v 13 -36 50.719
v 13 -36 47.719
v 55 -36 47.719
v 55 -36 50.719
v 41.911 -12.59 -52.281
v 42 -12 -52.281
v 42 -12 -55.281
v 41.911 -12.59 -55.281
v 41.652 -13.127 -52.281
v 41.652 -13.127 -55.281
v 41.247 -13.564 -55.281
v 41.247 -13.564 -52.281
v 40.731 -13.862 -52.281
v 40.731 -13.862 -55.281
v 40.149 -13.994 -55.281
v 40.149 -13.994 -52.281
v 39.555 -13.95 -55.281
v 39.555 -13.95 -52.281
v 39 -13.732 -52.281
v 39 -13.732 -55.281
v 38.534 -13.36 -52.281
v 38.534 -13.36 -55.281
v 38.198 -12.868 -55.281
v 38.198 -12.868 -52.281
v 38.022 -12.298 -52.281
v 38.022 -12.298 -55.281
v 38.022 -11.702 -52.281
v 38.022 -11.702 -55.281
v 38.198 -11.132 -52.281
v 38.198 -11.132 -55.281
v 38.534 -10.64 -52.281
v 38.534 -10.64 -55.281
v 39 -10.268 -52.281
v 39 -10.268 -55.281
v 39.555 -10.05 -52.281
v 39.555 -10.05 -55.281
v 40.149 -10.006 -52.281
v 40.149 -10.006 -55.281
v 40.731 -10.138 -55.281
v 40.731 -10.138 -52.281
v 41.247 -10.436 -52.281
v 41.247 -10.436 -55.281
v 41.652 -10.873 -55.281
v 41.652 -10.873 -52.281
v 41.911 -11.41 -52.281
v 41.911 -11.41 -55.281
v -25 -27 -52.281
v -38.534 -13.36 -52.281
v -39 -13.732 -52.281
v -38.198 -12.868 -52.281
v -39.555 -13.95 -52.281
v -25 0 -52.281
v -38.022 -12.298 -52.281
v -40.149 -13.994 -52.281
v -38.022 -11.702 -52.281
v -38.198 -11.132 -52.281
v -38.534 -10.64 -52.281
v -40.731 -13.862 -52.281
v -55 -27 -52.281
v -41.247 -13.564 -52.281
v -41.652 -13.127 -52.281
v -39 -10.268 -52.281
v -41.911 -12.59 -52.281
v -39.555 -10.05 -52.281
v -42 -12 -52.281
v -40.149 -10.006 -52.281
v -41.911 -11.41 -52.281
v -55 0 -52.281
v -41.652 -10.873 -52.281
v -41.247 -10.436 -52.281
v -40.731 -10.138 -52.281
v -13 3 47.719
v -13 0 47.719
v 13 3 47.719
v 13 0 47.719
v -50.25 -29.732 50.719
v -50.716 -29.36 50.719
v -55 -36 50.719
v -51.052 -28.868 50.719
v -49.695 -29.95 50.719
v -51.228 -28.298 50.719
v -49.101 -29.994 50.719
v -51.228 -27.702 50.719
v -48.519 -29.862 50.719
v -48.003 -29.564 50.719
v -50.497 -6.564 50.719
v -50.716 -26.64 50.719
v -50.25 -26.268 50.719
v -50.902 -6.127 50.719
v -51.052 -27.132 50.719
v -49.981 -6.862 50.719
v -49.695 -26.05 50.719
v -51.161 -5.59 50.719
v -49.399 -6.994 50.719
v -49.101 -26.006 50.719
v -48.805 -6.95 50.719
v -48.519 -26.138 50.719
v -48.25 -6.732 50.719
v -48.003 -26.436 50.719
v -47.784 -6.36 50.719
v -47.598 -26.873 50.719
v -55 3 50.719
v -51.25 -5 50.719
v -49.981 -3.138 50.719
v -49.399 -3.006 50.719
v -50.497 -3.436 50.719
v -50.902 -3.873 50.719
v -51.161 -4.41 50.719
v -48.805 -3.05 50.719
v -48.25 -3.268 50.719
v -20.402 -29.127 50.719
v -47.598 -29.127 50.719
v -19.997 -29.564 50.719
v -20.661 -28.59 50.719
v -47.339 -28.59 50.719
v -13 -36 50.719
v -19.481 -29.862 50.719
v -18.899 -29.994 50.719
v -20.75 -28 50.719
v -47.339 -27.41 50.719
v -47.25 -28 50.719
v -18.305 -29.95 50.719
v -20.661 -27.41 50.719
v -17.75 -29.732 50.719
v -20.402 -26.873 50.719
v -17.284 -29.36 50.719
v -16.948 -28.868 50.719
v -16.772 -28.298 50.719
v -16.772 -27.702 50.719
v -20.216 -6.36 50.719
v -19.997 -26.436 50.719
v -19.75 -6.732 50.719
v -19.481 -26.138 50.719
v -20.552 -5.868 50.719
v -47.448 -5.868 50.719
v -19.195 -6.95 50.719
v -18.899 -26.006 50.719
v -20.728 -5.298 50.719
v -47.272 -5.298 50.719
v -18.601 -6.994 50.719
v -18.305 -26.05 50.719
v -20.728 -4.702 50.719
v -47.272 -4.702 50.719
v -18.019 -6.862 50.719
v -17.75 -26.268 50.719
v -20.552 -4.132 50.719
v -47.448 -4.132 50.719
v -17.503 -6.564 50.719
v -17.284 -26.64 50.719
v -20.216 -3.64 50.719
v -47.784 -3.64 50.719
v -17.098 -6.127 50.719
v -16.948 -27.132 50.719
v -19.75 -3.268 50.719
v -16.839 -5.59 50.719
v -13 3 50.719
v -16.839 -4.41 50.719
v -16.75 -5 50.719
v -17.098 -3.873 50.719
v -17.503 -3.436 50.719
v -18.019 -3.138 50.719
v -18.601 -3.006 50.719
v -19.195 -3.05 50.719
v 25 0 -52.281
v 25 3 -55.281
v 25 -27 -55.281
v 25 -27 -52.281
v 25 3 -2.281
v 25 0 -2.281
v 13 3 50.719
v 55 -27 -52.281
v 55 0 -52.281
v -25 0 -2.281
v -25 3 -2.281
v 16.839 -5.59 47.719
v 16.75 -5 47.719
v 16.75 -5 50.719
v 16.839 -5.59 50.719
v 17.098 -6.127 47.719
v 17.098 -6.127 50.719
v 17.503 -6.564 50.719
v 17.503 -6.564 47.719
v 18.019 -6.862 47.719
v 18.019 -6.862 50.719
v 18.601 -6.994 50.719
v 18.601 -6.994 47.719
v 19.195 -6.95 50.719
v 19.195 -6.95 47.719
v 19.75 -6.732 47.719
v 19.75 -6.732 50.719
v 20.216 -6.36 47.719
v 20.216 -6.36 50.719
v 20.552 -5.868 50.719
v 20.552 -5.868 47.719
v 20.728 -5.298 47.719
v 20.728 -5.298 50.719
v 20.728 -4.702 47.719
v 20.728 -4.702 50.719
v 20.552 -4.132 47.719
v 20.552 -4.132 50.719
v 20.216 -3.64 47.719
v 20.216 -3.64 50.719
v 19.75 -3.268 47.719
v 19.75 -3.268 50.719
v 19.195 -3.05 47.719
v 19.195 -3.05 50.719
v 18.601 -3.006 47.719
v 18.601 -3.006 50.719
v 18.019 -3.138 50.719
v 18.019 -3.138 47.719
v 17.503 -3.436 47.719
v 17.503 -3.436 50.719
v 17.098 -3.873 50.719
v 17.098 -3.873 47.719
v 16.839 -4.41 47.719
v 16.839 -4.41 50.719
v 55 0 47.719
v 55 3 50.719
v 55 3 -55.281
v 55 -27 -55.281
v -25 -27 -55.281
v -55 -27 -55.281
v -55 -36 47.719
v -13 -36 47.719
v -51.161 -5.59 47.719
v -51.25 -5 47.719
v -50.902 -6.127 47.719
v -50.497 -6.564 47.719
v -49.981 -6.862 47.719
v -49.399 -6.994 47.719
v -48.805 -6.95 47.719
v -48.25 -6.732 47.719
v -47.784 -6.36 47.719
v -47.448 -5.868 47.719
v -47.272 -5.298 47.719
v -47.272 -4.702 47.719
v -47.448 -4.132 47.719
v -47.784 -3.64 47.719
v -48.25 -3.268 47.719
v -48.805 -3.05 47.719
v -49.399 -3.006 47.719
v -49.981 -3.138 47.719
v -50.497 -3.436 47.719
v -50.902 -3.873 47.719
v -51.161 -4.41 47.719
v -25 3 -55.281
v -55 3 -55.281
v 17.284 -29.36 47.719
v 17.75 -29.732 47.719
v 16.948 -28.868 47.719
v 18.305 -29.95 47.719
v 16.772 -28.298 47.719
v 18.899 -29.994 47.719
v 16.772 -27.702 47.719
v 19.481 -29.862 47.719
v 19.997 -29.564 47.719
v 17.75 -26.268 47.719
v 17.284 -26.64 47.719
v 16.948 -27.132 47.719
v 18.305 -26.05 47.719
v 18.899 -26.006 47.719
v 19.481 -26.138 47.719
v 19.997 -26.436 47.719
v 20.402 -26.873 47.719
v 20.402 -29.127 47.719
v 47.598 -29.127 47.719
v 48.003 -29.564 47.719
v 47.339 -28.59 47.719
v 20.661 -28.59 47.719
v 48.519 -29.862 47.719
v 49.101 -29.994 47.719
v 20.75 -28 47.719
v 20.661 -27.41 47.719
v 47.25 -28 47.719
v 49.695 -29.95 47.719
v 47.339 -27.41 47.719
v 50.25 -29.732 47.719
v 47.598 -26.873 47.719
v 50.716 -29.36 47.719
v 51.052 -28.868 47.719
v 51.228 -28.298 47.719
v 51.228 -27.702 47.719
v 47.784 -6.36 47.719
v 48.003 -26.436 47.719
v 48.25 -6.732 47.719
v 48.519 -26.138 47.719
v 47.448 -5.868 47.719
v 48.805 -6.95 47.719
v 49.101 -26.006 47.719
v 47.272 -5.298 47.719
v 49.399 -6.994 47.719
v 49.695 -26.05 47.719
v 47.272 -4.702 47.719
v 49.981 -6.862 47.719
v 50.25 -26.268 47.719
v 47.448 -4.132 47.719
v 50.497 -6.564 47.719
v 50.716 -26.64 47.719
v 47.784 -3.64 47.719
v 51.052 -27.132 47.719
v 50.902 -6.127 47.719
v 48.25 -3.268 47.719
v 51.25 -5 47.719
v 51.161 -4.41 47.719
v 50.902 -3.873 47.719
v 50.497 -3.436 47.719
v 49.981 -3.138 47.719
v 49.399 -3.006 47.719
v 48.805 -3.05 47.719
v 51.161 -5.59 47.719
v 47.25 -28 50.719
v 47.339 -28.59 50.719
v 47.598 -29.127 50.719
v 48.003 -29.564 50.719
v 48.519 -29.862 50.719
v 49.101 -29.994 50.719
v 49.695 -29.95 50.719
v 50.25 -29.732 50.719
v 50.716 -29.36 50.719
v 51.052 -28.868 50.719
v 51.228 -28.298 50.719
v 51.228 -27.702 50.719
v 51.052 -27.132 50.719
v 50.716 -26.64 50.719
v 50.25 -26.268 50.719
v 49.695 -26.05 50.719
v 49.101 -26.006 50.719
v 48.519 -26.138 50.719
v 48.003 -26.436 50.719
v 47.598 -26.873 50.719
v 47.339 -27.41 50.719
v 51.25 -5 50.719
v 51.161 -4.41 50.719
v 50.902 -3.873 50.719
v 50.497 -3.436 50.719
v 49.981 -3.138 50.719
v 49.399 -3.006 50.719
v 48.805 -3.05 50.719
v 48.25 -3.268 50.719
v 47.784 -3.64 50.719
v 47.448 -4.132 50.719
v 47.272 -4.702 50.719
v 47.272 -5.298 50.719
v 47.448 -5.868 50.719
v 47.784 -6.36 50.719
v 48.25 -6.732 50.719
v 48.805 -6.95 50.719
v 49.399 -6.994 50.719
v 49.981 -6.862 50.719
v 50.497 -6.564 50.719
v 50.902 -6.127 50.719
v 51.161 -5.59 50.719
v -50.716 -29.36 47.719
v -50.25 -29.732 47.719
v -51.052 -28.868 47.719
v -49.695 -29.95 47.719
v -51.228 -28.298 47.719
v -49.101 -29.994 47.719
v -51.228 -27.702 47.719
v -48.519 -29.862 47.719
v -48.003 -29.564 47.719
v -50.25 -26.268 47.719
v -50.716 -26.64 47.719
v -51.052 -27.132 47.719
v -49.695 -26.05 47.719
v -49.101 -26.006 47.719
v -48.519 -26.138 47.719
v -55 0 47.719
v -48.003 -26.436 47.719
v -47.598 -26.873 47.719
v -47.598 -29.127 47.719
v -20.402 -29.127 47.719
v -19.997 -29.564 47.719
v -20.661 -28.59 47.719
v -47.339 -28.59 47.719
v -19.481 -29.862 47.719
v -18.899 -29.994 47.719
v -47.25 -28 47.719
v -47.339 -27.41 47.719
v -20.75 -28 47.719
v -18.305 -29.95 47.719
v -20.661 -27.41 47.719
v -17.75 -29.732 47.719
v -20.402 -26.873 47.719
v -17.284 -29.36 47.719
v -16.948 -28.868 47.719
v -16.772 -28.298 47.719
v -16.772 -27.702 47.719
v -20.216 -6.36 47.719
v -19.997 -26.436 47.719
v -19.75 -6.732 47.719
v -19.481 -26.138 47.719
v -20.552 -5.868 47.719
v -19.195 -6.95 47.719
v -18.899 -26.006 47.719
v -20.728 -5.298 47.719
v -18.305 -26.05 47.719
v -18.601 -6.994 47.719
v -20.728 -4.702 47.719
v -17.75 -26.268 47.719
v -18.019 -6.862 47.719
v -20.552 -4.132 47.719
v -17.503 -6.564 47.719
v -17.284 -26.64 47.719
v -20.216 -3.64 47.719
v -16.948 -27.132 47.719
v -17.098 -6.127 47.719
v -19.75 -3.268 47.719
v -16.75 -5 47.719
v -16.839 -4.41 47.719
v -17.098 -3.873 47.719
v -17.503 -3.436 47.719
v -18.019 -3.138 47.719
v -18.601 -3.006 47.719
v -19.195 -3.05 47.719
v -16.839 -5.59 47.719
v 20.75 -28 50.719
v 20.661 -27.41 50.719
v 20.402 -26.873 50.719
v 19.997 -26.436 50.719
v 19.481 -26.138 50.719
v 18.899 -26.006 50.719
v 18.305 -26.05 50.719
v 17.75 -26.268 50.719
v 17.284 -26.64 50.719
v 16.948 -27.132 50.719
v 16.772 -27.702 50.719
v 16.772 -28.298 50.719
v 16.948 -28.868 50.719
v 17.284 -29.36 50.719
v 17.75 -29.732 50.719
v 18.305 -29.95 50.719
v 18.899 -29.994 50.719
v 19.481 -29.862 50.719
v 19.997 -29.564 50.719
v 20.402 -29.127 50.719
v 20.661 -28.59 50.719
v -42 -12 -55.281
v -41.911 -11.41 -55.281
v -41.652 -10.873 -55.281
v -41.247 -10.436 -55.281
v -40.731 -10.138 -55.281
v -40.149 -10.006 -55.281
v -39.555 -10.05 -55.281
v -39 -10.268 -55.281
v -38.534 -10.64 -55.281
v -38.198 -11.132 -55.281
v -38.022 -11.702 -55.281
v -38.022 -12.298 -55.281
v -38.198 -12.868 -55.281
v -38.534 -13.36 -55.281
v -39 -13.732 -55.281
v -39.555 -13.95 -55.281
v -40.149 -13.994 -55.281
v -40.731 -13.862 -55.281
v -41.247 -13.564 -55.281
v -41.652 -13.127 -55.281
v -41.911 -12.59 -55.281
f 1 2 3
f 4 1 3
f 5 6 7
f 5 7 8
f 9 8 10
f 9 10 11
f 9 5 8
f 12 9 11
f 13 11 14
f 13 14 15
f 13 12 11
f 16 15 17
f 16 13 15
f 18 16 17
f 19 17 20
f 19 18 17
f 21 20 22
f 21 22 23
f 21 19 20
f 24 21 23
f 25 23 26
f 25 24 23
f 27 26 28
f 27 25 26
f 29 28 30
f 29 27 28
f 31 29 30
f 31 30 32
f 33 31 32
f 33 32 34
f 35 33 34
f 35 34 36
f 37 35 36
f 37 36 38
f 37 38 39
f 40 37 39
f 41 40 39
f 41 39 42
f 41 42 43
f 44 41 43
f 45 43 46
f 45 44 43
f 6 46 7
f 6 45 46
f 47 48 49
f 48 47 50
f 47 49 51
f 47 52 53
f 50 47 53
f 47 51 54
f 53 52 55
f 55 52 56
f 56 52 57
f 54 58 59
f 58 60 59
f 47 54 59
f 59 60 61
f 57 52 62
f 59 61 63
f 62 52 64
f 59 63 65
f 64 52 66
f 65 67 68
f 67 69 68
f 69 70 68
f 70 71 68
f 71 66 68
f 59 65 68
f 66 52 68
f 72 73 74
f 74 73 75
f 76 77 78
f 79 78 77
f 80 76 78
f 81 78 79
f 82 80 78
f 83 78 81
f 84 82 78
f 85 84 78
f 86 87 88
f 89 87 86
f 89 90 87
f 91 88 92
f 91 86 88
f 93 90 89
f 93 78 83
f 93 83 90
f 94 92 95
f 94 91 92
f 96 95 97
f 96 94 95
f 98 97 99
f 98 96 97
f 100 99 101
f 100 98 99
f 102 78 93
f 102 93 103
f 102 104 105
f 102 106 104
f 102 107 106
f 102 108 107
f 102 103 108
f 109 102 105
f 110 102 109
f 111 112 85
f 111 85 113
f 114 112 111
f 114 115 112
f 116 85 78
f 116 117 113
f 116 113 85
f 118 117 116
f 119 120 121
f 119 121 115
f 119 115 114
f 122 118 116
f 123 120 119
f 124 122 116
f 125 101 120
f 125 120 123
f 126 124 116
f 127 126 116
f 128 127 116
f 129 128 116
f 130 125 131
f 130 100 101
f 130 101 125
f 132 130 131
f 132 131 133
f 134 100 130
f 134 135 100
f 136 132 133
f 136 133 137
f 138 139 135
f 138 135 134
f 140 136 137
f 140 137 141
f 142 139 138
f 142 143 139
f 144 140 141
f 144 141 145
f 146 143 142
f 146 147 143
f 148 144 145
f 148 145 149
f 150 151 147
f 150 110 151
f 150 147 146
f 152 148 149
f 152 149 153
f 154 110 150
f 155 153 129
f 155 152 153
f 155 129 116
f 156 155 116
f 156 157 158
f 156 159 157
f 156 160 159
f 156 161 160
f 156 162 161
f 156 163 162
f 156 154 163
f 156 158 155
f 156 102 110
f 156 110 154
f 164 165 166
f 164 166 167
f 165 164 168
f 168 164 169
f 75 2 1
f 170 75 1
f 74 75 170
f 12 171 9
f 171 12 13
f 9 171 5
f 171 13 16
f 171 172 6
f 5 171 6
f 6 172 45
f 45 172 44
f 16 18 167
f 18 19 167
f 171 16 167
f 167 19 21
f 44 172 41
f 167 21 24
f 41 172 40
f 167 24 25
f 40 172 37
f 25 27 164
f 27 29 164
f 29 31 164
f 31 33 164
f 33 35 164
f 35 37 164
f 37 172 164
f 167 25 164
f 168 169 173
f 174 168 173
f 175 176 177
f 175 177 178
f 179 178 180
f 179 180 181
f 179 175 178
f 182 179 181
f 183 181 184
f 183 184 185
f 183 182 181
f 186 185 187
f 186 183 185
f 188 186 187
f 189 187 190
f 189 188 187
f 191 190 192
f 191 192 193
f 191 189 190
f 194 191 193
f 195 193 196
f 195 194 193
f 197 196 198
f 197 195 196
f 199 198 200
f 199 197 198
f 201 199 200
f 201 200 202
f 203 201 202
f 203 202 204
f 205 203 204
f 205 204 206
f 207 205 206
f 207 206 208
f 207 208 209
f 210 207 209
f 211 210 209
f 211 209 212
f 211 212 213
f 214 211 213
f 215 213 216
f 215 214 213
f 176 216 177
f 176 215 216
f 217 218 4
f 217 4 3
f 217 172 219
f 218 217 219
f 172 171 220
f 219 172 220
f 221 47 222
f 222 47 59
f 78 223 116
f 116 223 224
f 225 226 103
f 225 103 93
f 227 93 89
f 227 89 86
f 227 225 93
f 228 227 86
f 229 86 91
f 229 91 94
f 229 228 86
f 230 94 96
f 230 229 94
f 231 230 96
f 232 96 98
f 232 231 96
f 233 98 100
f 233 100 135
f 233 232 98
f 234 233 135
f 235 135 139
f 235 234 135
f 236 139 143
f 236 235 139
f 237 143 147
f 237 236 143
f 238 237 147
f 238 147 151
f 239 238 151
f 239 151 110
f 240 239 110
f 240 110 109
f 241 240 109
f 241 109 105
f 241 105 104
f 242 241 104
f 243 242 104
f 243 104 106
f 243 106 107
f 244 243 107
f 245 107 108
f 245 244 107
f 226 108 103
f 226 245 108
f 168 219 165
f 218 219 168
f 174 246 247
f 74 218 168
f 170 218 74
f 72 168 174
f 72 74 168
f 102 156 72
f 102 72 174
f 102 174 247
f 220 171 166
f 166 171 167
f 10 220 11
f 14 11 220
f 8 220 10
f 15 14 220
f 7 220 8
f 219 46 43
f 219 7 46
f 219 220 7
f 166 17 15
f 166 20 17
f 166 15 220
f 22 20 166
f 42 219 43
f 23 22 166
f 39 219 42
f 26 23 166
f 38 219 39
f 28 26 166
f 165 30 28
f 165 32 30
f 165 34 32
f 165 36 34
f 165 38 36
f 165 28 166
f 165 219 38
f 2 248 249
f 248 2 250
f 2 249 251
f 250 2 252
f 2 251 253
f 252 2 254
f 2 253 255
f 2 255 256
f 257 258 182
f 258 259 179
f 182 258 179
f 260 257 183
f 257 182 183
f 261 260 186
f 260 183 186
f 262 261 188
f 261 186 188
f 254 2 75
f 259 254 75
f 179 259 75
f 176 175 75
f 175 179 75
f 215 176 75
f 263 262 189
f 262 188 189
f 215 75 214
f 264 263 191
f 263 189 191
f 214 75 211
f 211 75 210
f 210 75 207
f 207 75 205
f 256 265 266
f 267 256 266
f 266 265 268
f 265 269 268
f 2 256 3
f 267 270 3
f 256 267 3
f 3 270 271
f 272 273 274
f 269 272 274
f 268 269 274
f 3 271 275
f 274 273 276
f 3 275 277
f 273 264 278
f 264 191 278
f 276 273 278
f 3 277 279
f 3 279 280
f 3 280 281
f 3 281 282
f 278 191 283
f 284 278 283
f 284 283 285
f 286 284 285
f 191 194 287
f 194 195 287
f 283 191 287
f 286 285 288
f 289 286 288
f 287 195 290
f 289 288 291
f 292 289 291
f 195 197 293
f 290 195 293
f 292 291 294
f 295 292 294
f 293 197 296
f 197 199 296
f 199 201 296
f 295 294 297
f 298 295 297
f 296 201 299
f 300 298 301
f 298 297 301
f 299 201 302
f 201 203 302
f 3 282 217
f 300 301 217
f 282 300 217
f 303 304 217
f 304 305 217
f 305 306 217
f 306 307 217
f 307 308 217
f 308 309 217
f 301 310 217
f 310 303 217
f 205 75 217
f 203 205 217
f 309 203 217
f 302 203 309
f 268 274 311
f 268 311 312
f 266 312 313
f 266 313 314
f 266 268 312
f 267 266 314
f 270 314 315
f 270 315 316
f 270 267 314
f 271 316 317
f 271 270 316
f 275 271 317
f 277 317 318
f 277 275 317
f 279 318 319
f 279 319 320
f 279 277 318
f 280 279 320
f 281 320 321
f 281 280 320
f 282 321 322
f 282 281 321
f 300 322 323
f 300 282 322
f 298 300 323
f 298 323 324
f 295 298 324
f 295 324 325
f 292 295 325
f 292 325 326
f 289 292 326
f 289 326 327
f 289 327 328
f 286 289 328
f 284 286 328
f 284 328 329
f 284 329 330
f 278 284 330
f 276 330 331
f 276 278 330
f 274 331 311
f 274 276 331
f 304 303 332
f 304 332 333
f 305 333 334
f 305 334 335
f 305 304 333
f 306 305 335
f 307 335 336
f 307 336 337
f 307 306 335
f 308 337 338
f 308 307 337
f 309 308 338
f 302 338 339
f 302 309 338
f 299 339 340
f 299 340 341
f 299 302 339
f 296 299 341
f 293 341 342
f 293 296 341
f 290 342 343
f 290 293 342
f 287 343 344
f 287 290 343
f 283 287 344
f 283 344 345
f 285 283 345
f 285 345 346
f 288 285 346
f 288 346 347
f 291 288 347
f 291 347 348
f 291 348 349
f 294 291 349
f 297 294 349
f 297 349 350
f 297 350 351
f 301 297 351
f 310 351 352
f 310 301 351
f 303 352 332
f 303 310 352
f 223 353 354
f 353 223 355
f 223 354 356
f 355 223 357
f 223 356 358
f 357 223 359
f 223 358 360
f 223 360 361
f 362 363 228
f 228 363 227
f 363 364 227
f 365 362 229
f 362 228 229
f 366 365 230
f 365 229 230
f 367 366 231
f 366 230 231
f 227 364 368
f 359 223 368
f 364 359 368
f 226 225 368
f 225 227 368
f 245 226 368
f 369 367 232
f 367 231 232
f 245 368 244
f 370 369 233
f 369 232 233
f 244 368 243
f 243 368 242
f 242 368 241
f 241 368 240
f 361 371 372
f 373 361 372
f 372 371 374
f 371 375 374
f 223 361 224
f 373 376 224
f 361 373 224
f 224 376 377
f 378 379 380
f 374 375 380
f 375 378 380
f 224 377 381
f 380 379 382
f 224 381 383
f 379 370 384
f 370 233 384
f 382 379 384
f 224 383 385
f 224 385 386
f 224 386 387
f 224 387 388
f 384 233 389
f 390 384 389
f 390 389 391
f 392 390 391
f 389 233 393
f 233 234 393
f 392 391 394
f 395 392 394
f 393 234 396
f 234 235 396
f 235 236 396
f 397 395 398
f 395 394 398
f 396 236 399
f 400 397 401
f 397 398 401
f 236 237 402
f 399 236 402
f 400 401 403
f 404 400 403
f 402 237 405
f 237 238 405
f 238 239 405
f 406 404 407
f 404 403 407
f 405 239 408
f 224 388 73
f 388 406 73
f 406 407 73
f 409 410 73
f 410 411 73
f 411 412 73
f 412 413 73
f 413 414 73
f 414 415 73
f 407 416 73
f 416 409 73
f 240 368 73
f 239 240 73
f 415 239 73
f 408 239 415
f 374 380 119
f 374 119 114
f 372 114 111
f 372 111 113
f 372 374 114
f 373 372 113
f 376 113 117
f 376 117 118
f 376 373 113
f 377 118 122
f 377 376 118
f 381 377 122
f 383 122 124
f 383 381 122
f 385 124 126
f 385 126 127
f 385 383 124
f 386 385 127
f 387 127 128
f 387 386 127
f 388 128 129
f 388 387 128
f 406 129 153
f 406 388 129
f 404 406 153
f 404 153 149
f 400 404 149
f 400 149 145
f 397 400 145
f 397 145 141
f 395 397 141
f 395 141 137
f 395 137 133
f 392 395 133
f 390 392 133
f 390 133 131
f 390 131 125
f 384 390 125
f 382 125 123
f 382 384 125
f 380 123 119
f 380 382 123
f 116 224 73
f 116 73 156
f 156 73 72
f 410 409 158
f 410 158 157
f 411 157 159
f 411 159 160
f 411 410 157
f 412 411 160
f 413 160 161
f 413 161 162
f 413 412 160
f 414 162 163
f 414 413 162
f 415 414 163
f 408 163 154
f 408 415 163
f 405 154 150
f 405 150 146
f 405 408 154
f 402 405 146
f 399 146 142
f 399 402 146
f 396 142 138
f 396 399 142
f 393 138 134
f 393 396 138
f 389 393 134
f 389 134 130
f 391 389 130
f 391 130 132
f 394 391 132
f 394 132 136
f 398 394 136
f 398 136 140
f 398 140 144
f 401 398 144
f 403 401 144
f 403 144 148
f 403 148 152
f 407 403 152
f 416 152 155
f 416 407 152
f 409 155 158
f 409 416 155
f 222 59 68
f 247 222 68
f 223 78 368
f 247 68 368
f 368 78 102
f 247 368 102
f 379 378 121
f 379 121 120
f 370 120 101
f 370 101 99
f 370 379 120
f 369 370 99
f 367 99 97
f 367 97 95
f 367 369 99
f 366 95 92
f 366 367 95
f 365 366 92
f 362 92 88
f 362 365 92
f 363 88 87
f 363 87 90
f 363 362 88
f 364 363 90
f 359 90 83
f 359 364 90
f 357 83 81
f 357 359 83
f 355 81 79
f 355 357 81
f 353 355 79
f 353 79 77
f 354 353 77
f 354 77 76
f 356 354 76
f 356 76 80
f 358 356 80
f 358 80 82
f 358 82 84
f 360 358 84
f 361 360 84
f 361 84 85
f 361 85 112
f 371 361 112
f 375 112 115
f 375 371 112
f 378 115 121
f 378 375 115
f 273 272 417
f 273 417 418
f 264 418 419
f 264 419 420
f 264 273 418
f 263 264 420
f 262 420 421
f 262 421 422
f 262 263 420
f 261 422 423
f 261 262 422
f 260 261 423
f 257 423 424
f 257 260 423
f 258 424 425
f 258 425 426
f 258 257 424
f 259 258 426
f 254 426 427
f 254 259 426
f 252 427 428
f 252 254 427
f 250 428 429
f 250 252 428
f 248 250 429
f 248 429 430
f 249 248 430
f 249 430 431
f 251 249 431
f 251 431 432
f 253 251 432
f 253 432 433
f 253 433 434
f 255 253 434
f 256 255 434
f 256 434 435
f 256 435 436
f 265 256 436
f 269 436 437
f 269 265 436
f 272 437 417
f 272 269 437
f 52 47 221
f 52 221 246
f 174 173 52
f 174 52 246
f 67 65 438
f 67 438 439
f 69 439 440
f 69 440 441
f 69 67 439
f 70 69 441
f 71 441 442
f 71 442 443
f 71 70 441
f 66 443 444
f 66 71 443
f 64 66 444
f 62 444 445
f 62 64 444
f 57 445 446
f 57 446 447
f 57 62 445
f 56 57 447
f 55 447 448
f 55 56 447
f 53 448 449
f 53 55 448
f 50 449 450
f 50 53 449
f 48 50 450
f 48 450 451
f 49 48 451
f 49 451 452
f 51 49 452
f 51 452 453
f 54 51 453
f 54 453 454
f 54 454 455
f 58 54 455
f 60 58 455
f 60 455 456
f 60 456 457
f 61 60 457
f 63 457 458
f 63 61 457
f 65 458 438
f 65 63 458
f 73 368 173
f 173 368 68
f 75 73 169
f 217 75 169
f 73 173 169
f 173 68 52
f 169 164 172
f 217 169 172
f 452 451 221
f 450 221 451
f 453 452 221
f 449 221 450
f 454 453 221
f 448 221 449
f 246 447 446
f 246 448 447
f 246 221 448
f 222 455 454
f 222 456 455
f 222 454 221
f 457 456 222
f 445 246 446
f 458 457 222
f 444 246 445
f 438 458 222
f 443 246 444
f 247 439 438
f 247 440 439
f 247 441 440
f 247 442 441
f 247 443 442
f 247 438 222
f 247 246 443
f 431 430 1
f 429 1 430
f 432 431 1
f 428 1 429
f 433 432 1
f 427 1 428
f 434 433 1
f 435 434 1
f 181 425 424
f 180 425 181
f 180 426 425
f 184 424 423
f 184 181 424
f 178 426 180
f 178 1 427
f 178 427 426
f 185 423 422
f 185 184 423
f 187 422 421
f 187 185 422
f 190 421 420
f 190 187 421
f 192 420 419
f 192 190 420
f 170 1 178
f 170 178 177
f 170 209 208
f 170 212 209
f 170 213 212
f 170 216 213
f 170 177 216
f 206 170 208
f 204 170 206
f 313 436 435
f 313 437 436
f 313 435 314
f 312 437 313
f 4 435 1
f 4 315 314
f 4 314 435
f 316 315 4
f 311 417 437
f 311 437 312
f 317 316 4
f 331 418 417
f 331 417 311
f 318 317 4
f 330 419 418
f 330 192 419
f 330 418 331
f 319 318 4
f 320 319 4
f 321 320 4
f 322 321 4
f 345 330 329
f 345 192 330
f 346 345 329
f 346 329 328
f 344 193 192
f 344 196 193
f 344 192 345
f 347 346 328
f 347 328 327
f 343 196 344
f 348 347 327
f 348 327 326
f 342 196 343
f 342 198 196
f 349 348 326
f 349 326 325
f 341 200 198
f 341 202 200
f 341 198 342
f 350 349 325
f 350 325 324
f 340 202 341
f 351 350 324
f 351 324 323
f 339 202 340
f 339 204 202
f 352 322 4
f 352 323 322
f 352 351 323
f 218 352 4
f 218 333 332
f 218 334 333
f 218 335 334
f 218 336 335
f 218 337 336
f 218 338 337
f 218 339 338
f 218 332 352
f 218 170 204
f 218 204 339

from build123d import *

# Parameters (mm, degrees)
BOSS_EXTRUDE1_DEPTH = 3
SKETCH4_W           = 42
SKETCH4_H           = 39
SKETCH4_R           = 2
BOSS_EXTRUDE2_DEPTH = 3
SKETCH5_W           = 30
SKETCH5_H           = 30
SKETCH5_R           = 2
BOSS_EXTRUDE3_DEPTH = 3


with BuildPart() as part:
    # Sketch2 → Boss-Extrude1 (new body)
    with BuildSketch(Plane(origin=(0, 0, 0), x_dir=(1, 0, 0), z_dir=(0, 1, 0))):
        Polygon((-55, 52.280903811), (-55, -47.719096189), (55, -47.719096189), (55, 52.280903811), (25, 52.280903811), (25, 2.280903811), (-25, 2.280903811), (-25, 52.280903811), align=None)
    extrude(amount=BOSS_EXTRUDE1_DEPTH)

    # Sketch4 → Boss-Extrude2 (add)
    # profile 1 of 2: a face of its own
    with BuildSketch(Plane.XY.offset(47.719096189)):
        with Locations((-34, -16.5)):
            Rectangle(SKETCH4_W, SKETCH4_H)
        with Locations((-18.75, -5)):
            Circle(SKETCH4_R, mode=Mode.SUBTRACT)
        with Locations(Location((-49.25, -5, 0), (0, 0, 180))):
            Circle(SKETCH4_R, mode=Mode.SUBTRACT)
        with Locations(Location((-18.75, -28, 0), (0, 0, 180))):
            Circle(SKETCH4_R, mode=Mode.SUBTRACT)
        with Locations((-49.25, -28)):
            Circle(SKETCH4_R, mode=Mode.SUBTRACT)
    # profile 2 of 2: a face of its own
    with BuildSketch(Plane.XY.offset(47.719096189)):
        with Locations((34, -16.5)):
            Rectangle(SKETCH4_W, SKETCH4_H)
        with Locations((49.25, -5)):
            Circle(SKETCH4_R, mode=Mode.SUBTRACT)
        with Locations(Location((49.25, -28, 0), (0, 0, 180))):
            Circle(SKETCH4_R, mode=Mode.SUBTRACT)
        with Locations(Location((18.75, -5, 0), (0, 0, 180))):
            Circle(SKETCH4_R, mode=Mode.SUBTRACT)
        with Locations((18.75, -28)):
            Circle(SKETCH4_R, mode=Mode.SUBTRACT)
    extrude(amount=BOSS_EXTRUDE2_DEPTH)

    # Sketch5 → Boss-Extrude3 (add)
    # profile 1 of 2: a face of its own
    with BuildSketch(Plane(origin=(0, 0, -52.280903811), x_dir=(-1, 0, 0), z_dir=(0, 0, -1))):
        with Locations((40, -12)):
            Rectangle(SKETCH5_W, SKETCH5_H)
        with Locations((40, -12)):
            Circle(SKETCH5_R, mode=Mode.SUBTRACT)
    # profile 2 of 2: a face of its own
    with BuildSketch(Plane(origin=(0, 0, -52.280903811), x_dir=(-1, 0, 0), z_dir=(0, 0, -1))):
        with Locations((-40, -12)):
            Rectangle(SKETCH5_W, SKETCH5_H)
        with Locations(Location((-40, -12, 0), (0, 0, 180))):
            Circle(SKETCH5_R, mode=Mode.SUBTRACT)
    extrude(amount=BOSS_EXTRUDE3_DEPTH)


solid = part.part
